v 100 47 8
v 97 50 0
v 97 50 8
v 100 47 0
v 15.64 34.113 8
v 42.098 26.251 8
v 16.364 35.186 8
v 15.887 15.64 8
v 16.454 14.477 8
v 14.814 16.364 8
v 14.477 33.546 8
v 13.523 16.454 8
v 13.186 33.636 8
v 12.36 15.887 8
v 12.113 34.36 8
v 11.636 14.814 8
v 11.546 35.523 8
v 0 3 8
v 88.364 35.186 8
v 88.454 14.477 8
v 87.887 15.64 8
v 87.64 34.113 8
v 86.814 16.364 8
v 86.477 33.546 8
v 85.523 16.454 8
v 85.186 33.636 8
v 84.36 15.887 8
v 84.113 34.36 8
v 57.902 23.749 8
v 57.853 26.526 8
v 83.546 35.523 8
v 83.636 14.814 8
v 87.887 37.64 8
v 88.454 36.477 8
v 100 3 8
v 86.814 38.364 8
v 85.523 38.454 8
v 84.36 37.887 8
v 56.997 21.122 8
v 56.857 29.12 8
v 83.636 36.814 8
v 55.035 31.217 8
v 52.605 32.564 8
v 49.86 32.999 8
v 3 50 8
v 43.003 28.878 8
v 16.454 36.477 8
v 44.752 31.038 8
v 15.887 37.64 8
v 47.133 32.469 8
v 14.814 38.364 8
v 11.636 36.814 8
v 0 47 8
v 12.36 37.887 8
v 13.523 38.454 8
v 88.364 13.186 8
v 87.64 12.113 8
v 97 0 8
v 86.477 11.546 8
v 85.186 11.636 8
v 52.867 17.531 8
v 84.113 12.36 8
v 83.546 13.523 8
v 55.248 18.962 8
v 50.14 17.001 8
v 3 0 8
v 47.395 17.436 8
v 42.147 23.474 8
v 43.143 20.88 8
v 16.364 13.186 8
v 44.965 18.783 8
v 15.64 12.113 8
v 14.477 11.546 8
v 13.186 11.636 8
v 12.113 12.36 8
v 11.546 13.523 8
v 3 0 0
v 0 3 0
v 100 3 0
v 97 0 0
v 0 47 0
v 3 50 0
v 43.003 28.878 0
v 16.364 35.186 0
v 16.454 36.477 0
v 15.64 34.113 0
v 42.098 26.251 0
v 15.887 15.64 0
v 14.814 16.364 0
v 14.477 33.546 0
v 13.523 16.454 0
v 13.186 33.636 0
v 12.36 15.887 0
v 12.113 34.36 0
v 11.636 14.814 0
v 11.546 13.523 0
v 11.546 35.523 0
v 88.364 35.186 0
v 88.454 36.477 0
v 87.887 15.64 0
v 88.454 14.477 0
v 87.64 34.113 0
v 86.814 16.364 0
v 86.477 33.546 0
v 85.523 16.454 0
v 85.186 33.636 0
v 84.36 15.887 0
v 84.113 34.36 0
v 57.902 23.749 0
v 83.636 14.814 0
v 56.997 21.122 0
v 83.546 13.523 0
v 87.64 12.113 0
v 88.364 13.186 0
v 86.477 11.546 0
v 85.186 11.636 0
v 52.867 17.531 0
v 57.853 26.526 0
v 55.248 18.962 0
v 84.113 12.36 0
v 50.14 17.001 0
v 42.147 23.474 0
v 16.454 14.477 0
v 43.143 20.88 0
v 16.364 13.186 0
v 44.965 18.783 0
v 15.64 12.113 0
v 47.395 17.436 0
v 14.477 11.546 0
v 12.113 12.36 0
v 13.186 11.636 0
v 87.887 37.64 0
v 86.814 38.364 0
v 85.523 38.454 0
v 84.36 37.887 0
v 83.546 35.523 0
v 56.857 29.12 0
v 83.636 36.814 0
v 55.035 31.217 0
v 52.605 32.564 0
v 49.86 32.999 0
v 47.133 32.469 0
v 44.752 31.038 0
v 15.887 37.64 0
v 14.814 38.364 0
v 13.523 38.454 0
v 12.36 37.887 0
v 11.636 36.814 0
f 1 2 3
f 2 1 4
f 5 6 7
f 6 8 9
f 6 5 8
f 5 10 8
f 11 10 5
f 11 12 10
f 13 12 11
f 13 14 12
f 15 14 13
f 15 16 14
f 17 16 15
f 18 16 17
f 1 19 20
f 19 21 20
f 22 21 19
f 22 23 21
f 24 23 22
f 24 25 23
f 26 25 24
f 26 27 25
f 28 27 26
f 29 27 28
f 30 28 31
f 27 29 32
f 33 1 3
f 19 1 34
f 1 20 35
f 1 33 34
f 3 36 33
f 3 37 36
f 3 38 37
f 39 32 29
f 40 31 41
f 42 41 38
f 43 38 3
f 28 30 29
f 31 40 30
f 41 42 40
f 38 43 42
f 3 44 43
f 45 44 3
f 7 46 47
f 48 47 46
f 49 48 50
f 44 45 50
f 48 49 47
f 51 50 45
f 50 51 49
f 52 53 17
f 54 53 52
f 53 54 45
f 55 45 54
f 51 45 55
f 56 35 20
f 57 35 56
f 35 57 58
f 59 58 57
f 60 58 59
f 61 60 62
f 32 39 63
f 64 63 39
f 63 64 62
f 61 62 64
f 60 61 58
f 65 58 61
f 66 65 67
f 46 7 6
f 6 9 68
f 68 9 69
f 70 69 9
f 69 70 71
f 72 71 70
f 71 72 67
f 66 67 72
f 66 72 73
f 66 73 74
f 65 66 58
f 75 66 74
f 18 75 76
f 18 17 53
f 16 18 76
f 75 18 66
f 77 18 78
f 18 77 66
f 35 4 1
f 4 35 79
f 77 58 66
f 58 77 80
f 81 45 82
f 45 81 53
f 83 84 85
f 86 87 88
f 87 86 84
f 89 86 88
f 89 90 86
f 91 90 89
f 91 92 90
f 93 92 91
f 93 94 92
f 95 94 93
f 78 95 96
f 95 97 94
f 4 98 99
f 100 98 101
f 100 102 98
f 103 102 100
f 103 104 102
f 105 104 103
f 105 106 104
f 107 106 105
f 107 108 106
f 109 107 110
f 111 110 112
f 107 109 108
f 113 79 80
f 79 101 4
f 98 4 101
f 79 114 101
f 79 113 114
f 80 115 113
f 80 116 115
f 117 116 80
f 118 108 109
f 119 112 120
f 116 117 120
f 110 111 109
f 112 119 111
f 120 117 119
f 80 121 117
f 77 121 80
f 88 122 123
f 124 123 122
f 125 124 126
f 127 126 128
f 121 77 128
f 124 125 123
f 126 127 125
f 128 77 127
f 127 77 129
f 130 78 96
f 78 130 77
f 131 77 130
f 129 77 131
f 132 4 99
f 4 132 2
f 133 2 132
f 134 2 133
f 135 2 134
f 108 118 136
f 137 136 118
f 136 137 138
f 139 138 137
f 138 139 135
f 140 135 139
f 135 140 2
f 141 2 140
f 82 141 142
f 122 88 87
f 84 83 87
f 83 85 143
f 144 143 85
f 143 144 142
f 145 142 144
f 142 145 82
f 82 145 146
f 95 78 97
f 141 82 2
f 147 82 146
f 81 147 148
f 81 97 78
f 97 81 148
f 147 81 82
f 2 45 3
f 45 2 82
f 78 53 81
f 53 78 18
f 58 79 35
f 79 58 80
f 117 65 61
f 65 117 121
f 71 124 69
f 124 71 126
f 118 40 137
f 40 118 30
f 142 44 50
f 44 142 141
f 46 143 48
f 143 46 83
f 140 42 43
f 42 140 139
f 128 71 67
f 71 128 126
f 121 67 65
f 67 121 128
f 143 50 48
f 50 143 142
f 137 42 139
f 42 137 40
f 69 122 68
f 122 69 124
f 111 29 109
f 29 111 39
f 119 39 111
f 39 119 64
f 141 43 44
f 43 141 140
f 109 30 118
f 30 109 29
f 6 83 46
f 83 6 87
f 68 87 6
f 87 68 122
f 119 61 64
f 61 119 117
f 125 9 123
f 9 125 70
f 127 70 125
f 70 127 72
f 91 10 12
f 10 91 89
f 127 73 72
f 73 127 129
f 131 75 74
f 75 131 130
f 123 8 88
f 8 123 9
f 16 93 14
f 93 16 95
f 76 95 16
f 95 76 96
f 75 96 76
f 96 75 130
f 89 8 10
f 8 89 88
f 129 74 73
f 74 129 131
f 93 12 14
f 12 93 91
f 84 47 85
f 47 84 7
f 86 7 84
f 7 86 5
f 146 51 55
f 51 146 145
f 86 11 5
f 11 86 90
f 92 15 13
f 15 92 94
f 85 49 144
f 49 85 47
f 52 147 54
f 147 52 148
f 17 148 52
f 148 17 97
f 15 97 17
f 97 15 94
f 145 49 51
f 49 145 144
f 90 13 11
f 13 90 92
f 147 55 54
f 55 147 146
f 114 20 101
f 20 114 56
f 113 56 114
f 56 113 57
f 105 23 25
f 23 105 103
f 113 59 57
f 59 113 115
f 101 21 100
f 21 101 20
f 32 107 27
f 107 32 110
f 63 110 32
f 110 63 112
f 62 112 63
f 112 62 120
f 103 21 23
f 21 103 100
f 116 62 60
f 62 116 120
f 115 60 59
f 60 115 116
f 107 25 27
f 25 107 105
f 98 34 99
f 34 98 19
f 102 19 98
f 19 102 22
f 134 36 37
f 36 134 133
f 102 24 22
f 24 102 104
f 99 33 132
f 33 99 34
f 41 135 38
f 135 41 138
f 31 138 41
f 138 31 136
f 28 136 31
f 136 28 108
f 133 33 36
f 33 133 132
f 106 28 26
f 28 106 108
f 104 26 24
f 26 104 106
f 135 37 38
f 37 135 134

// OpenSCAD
$fn = 32;

// ----------------------------------------------------------------------
// Spacer plate: rect 100 x 50
// ----------------------------------------------------------------------

// --- parameters (mm) ---
bore_r = 8;               // centre bore radius
bolt_r = 2.5;             // bolt hole radius
plate_t = 8;              // plate thickness, Z (extrusion height)
plate_l = 100;            // plate length, X
plate_w = 50;             // plate width, Y
inset = 14;               // corner hole inset

profile = [[3, 0], [97, 0], [100, 3], [100, 47], [97, 50], [3, 50], [0, 47], [0, 3]];  // primary outline, 8 points, counter clockwise
void_1 = [[57.853, 26.526], [56.857, 29.12], [55.035, 31.217], [52.605, 32.564], [49.86, 32.999], [47.133, 32.469], [44.752, 31.038], [43.003, 28.878], [42.098, 26.251], [42.147, 23.474], [43.143, 20.88], [44.965, 18.783], [47.395, 17.436], [50.14, 17.001], [52.867, 17.531], [55.248, 18.962], [56.997, 21.122], [57.902, 23.749]];  // centre bore, 18 points
void_2 = [[16.454, 14.477], [15.887, 15.64], [14.814, 16.364], [13.523, 16.454], [12.36, 15.887], [11.636, 14.814], [11.546, 13.523], [12.113, 12.36], [13.186, 11.636], [14.477, 11.546], [15.64, 12.113], [16.364, 13.186]];  // corner hole, 12 points
void_3 = [[16.454, 36.477], [15.887, 37.64], [14.814, 38.364], [13.523, 38.454], [12.36, 37.887], [11.636, 36.814], [11.546, 35.523], [12.113, 34.36], [13.186, 33.636], [14.477, 33.546], [15.64, 34.113], [16.364, 35.186]];  // corner hole, 12 points
void_4 = [[88.454, 14.477], [87.887, 15.64], [86.814, 16.364], [85.523, 16.454], [84.36, 15.887], [83.636, 14.814], [83.546, 13.523], [84.113, 12.36], [85.186, 11.636], [86.477, 11.546], [87.64, 12.113], [88.364, 13.186]];  // corner hole, 12 points
void_5 = [[88.454, 36.477], [87.887, 37.64], [86.814, 38.364], [85.523, 38.454], [84.36, 37.887], [83.636, 36.814], [83.546, 35.523], [84.113, 34.36], [85.186, 33.636], [86.477, 33.546], [87.64, 34.113], [88.364, 35.186]];  // corner hole, 12 points

// --- the one profile operation ---
difference() {
  linear_extrude(height = plate_t) polygon(points = profile);
  translate([0, 0, -1])
    linear_extrude(height = plate_t + 2) polygon(points = void_1);
  translate([0, 0, -1])
    linear_extrude(height = plate_t + 2) polygon(points = void_2);
  translate([0, 0, -1])
    linear_extrude(height = plate_t + 2) polygon(points = void_3);
  translate([0, 0, -1])
    linear_extrude(height = plate_t + 2) polygon(points = void_4);
  translate([0, 0, -1])
    linear_extrude(height = plate_t + 2) polygon(points = void_5);
}
